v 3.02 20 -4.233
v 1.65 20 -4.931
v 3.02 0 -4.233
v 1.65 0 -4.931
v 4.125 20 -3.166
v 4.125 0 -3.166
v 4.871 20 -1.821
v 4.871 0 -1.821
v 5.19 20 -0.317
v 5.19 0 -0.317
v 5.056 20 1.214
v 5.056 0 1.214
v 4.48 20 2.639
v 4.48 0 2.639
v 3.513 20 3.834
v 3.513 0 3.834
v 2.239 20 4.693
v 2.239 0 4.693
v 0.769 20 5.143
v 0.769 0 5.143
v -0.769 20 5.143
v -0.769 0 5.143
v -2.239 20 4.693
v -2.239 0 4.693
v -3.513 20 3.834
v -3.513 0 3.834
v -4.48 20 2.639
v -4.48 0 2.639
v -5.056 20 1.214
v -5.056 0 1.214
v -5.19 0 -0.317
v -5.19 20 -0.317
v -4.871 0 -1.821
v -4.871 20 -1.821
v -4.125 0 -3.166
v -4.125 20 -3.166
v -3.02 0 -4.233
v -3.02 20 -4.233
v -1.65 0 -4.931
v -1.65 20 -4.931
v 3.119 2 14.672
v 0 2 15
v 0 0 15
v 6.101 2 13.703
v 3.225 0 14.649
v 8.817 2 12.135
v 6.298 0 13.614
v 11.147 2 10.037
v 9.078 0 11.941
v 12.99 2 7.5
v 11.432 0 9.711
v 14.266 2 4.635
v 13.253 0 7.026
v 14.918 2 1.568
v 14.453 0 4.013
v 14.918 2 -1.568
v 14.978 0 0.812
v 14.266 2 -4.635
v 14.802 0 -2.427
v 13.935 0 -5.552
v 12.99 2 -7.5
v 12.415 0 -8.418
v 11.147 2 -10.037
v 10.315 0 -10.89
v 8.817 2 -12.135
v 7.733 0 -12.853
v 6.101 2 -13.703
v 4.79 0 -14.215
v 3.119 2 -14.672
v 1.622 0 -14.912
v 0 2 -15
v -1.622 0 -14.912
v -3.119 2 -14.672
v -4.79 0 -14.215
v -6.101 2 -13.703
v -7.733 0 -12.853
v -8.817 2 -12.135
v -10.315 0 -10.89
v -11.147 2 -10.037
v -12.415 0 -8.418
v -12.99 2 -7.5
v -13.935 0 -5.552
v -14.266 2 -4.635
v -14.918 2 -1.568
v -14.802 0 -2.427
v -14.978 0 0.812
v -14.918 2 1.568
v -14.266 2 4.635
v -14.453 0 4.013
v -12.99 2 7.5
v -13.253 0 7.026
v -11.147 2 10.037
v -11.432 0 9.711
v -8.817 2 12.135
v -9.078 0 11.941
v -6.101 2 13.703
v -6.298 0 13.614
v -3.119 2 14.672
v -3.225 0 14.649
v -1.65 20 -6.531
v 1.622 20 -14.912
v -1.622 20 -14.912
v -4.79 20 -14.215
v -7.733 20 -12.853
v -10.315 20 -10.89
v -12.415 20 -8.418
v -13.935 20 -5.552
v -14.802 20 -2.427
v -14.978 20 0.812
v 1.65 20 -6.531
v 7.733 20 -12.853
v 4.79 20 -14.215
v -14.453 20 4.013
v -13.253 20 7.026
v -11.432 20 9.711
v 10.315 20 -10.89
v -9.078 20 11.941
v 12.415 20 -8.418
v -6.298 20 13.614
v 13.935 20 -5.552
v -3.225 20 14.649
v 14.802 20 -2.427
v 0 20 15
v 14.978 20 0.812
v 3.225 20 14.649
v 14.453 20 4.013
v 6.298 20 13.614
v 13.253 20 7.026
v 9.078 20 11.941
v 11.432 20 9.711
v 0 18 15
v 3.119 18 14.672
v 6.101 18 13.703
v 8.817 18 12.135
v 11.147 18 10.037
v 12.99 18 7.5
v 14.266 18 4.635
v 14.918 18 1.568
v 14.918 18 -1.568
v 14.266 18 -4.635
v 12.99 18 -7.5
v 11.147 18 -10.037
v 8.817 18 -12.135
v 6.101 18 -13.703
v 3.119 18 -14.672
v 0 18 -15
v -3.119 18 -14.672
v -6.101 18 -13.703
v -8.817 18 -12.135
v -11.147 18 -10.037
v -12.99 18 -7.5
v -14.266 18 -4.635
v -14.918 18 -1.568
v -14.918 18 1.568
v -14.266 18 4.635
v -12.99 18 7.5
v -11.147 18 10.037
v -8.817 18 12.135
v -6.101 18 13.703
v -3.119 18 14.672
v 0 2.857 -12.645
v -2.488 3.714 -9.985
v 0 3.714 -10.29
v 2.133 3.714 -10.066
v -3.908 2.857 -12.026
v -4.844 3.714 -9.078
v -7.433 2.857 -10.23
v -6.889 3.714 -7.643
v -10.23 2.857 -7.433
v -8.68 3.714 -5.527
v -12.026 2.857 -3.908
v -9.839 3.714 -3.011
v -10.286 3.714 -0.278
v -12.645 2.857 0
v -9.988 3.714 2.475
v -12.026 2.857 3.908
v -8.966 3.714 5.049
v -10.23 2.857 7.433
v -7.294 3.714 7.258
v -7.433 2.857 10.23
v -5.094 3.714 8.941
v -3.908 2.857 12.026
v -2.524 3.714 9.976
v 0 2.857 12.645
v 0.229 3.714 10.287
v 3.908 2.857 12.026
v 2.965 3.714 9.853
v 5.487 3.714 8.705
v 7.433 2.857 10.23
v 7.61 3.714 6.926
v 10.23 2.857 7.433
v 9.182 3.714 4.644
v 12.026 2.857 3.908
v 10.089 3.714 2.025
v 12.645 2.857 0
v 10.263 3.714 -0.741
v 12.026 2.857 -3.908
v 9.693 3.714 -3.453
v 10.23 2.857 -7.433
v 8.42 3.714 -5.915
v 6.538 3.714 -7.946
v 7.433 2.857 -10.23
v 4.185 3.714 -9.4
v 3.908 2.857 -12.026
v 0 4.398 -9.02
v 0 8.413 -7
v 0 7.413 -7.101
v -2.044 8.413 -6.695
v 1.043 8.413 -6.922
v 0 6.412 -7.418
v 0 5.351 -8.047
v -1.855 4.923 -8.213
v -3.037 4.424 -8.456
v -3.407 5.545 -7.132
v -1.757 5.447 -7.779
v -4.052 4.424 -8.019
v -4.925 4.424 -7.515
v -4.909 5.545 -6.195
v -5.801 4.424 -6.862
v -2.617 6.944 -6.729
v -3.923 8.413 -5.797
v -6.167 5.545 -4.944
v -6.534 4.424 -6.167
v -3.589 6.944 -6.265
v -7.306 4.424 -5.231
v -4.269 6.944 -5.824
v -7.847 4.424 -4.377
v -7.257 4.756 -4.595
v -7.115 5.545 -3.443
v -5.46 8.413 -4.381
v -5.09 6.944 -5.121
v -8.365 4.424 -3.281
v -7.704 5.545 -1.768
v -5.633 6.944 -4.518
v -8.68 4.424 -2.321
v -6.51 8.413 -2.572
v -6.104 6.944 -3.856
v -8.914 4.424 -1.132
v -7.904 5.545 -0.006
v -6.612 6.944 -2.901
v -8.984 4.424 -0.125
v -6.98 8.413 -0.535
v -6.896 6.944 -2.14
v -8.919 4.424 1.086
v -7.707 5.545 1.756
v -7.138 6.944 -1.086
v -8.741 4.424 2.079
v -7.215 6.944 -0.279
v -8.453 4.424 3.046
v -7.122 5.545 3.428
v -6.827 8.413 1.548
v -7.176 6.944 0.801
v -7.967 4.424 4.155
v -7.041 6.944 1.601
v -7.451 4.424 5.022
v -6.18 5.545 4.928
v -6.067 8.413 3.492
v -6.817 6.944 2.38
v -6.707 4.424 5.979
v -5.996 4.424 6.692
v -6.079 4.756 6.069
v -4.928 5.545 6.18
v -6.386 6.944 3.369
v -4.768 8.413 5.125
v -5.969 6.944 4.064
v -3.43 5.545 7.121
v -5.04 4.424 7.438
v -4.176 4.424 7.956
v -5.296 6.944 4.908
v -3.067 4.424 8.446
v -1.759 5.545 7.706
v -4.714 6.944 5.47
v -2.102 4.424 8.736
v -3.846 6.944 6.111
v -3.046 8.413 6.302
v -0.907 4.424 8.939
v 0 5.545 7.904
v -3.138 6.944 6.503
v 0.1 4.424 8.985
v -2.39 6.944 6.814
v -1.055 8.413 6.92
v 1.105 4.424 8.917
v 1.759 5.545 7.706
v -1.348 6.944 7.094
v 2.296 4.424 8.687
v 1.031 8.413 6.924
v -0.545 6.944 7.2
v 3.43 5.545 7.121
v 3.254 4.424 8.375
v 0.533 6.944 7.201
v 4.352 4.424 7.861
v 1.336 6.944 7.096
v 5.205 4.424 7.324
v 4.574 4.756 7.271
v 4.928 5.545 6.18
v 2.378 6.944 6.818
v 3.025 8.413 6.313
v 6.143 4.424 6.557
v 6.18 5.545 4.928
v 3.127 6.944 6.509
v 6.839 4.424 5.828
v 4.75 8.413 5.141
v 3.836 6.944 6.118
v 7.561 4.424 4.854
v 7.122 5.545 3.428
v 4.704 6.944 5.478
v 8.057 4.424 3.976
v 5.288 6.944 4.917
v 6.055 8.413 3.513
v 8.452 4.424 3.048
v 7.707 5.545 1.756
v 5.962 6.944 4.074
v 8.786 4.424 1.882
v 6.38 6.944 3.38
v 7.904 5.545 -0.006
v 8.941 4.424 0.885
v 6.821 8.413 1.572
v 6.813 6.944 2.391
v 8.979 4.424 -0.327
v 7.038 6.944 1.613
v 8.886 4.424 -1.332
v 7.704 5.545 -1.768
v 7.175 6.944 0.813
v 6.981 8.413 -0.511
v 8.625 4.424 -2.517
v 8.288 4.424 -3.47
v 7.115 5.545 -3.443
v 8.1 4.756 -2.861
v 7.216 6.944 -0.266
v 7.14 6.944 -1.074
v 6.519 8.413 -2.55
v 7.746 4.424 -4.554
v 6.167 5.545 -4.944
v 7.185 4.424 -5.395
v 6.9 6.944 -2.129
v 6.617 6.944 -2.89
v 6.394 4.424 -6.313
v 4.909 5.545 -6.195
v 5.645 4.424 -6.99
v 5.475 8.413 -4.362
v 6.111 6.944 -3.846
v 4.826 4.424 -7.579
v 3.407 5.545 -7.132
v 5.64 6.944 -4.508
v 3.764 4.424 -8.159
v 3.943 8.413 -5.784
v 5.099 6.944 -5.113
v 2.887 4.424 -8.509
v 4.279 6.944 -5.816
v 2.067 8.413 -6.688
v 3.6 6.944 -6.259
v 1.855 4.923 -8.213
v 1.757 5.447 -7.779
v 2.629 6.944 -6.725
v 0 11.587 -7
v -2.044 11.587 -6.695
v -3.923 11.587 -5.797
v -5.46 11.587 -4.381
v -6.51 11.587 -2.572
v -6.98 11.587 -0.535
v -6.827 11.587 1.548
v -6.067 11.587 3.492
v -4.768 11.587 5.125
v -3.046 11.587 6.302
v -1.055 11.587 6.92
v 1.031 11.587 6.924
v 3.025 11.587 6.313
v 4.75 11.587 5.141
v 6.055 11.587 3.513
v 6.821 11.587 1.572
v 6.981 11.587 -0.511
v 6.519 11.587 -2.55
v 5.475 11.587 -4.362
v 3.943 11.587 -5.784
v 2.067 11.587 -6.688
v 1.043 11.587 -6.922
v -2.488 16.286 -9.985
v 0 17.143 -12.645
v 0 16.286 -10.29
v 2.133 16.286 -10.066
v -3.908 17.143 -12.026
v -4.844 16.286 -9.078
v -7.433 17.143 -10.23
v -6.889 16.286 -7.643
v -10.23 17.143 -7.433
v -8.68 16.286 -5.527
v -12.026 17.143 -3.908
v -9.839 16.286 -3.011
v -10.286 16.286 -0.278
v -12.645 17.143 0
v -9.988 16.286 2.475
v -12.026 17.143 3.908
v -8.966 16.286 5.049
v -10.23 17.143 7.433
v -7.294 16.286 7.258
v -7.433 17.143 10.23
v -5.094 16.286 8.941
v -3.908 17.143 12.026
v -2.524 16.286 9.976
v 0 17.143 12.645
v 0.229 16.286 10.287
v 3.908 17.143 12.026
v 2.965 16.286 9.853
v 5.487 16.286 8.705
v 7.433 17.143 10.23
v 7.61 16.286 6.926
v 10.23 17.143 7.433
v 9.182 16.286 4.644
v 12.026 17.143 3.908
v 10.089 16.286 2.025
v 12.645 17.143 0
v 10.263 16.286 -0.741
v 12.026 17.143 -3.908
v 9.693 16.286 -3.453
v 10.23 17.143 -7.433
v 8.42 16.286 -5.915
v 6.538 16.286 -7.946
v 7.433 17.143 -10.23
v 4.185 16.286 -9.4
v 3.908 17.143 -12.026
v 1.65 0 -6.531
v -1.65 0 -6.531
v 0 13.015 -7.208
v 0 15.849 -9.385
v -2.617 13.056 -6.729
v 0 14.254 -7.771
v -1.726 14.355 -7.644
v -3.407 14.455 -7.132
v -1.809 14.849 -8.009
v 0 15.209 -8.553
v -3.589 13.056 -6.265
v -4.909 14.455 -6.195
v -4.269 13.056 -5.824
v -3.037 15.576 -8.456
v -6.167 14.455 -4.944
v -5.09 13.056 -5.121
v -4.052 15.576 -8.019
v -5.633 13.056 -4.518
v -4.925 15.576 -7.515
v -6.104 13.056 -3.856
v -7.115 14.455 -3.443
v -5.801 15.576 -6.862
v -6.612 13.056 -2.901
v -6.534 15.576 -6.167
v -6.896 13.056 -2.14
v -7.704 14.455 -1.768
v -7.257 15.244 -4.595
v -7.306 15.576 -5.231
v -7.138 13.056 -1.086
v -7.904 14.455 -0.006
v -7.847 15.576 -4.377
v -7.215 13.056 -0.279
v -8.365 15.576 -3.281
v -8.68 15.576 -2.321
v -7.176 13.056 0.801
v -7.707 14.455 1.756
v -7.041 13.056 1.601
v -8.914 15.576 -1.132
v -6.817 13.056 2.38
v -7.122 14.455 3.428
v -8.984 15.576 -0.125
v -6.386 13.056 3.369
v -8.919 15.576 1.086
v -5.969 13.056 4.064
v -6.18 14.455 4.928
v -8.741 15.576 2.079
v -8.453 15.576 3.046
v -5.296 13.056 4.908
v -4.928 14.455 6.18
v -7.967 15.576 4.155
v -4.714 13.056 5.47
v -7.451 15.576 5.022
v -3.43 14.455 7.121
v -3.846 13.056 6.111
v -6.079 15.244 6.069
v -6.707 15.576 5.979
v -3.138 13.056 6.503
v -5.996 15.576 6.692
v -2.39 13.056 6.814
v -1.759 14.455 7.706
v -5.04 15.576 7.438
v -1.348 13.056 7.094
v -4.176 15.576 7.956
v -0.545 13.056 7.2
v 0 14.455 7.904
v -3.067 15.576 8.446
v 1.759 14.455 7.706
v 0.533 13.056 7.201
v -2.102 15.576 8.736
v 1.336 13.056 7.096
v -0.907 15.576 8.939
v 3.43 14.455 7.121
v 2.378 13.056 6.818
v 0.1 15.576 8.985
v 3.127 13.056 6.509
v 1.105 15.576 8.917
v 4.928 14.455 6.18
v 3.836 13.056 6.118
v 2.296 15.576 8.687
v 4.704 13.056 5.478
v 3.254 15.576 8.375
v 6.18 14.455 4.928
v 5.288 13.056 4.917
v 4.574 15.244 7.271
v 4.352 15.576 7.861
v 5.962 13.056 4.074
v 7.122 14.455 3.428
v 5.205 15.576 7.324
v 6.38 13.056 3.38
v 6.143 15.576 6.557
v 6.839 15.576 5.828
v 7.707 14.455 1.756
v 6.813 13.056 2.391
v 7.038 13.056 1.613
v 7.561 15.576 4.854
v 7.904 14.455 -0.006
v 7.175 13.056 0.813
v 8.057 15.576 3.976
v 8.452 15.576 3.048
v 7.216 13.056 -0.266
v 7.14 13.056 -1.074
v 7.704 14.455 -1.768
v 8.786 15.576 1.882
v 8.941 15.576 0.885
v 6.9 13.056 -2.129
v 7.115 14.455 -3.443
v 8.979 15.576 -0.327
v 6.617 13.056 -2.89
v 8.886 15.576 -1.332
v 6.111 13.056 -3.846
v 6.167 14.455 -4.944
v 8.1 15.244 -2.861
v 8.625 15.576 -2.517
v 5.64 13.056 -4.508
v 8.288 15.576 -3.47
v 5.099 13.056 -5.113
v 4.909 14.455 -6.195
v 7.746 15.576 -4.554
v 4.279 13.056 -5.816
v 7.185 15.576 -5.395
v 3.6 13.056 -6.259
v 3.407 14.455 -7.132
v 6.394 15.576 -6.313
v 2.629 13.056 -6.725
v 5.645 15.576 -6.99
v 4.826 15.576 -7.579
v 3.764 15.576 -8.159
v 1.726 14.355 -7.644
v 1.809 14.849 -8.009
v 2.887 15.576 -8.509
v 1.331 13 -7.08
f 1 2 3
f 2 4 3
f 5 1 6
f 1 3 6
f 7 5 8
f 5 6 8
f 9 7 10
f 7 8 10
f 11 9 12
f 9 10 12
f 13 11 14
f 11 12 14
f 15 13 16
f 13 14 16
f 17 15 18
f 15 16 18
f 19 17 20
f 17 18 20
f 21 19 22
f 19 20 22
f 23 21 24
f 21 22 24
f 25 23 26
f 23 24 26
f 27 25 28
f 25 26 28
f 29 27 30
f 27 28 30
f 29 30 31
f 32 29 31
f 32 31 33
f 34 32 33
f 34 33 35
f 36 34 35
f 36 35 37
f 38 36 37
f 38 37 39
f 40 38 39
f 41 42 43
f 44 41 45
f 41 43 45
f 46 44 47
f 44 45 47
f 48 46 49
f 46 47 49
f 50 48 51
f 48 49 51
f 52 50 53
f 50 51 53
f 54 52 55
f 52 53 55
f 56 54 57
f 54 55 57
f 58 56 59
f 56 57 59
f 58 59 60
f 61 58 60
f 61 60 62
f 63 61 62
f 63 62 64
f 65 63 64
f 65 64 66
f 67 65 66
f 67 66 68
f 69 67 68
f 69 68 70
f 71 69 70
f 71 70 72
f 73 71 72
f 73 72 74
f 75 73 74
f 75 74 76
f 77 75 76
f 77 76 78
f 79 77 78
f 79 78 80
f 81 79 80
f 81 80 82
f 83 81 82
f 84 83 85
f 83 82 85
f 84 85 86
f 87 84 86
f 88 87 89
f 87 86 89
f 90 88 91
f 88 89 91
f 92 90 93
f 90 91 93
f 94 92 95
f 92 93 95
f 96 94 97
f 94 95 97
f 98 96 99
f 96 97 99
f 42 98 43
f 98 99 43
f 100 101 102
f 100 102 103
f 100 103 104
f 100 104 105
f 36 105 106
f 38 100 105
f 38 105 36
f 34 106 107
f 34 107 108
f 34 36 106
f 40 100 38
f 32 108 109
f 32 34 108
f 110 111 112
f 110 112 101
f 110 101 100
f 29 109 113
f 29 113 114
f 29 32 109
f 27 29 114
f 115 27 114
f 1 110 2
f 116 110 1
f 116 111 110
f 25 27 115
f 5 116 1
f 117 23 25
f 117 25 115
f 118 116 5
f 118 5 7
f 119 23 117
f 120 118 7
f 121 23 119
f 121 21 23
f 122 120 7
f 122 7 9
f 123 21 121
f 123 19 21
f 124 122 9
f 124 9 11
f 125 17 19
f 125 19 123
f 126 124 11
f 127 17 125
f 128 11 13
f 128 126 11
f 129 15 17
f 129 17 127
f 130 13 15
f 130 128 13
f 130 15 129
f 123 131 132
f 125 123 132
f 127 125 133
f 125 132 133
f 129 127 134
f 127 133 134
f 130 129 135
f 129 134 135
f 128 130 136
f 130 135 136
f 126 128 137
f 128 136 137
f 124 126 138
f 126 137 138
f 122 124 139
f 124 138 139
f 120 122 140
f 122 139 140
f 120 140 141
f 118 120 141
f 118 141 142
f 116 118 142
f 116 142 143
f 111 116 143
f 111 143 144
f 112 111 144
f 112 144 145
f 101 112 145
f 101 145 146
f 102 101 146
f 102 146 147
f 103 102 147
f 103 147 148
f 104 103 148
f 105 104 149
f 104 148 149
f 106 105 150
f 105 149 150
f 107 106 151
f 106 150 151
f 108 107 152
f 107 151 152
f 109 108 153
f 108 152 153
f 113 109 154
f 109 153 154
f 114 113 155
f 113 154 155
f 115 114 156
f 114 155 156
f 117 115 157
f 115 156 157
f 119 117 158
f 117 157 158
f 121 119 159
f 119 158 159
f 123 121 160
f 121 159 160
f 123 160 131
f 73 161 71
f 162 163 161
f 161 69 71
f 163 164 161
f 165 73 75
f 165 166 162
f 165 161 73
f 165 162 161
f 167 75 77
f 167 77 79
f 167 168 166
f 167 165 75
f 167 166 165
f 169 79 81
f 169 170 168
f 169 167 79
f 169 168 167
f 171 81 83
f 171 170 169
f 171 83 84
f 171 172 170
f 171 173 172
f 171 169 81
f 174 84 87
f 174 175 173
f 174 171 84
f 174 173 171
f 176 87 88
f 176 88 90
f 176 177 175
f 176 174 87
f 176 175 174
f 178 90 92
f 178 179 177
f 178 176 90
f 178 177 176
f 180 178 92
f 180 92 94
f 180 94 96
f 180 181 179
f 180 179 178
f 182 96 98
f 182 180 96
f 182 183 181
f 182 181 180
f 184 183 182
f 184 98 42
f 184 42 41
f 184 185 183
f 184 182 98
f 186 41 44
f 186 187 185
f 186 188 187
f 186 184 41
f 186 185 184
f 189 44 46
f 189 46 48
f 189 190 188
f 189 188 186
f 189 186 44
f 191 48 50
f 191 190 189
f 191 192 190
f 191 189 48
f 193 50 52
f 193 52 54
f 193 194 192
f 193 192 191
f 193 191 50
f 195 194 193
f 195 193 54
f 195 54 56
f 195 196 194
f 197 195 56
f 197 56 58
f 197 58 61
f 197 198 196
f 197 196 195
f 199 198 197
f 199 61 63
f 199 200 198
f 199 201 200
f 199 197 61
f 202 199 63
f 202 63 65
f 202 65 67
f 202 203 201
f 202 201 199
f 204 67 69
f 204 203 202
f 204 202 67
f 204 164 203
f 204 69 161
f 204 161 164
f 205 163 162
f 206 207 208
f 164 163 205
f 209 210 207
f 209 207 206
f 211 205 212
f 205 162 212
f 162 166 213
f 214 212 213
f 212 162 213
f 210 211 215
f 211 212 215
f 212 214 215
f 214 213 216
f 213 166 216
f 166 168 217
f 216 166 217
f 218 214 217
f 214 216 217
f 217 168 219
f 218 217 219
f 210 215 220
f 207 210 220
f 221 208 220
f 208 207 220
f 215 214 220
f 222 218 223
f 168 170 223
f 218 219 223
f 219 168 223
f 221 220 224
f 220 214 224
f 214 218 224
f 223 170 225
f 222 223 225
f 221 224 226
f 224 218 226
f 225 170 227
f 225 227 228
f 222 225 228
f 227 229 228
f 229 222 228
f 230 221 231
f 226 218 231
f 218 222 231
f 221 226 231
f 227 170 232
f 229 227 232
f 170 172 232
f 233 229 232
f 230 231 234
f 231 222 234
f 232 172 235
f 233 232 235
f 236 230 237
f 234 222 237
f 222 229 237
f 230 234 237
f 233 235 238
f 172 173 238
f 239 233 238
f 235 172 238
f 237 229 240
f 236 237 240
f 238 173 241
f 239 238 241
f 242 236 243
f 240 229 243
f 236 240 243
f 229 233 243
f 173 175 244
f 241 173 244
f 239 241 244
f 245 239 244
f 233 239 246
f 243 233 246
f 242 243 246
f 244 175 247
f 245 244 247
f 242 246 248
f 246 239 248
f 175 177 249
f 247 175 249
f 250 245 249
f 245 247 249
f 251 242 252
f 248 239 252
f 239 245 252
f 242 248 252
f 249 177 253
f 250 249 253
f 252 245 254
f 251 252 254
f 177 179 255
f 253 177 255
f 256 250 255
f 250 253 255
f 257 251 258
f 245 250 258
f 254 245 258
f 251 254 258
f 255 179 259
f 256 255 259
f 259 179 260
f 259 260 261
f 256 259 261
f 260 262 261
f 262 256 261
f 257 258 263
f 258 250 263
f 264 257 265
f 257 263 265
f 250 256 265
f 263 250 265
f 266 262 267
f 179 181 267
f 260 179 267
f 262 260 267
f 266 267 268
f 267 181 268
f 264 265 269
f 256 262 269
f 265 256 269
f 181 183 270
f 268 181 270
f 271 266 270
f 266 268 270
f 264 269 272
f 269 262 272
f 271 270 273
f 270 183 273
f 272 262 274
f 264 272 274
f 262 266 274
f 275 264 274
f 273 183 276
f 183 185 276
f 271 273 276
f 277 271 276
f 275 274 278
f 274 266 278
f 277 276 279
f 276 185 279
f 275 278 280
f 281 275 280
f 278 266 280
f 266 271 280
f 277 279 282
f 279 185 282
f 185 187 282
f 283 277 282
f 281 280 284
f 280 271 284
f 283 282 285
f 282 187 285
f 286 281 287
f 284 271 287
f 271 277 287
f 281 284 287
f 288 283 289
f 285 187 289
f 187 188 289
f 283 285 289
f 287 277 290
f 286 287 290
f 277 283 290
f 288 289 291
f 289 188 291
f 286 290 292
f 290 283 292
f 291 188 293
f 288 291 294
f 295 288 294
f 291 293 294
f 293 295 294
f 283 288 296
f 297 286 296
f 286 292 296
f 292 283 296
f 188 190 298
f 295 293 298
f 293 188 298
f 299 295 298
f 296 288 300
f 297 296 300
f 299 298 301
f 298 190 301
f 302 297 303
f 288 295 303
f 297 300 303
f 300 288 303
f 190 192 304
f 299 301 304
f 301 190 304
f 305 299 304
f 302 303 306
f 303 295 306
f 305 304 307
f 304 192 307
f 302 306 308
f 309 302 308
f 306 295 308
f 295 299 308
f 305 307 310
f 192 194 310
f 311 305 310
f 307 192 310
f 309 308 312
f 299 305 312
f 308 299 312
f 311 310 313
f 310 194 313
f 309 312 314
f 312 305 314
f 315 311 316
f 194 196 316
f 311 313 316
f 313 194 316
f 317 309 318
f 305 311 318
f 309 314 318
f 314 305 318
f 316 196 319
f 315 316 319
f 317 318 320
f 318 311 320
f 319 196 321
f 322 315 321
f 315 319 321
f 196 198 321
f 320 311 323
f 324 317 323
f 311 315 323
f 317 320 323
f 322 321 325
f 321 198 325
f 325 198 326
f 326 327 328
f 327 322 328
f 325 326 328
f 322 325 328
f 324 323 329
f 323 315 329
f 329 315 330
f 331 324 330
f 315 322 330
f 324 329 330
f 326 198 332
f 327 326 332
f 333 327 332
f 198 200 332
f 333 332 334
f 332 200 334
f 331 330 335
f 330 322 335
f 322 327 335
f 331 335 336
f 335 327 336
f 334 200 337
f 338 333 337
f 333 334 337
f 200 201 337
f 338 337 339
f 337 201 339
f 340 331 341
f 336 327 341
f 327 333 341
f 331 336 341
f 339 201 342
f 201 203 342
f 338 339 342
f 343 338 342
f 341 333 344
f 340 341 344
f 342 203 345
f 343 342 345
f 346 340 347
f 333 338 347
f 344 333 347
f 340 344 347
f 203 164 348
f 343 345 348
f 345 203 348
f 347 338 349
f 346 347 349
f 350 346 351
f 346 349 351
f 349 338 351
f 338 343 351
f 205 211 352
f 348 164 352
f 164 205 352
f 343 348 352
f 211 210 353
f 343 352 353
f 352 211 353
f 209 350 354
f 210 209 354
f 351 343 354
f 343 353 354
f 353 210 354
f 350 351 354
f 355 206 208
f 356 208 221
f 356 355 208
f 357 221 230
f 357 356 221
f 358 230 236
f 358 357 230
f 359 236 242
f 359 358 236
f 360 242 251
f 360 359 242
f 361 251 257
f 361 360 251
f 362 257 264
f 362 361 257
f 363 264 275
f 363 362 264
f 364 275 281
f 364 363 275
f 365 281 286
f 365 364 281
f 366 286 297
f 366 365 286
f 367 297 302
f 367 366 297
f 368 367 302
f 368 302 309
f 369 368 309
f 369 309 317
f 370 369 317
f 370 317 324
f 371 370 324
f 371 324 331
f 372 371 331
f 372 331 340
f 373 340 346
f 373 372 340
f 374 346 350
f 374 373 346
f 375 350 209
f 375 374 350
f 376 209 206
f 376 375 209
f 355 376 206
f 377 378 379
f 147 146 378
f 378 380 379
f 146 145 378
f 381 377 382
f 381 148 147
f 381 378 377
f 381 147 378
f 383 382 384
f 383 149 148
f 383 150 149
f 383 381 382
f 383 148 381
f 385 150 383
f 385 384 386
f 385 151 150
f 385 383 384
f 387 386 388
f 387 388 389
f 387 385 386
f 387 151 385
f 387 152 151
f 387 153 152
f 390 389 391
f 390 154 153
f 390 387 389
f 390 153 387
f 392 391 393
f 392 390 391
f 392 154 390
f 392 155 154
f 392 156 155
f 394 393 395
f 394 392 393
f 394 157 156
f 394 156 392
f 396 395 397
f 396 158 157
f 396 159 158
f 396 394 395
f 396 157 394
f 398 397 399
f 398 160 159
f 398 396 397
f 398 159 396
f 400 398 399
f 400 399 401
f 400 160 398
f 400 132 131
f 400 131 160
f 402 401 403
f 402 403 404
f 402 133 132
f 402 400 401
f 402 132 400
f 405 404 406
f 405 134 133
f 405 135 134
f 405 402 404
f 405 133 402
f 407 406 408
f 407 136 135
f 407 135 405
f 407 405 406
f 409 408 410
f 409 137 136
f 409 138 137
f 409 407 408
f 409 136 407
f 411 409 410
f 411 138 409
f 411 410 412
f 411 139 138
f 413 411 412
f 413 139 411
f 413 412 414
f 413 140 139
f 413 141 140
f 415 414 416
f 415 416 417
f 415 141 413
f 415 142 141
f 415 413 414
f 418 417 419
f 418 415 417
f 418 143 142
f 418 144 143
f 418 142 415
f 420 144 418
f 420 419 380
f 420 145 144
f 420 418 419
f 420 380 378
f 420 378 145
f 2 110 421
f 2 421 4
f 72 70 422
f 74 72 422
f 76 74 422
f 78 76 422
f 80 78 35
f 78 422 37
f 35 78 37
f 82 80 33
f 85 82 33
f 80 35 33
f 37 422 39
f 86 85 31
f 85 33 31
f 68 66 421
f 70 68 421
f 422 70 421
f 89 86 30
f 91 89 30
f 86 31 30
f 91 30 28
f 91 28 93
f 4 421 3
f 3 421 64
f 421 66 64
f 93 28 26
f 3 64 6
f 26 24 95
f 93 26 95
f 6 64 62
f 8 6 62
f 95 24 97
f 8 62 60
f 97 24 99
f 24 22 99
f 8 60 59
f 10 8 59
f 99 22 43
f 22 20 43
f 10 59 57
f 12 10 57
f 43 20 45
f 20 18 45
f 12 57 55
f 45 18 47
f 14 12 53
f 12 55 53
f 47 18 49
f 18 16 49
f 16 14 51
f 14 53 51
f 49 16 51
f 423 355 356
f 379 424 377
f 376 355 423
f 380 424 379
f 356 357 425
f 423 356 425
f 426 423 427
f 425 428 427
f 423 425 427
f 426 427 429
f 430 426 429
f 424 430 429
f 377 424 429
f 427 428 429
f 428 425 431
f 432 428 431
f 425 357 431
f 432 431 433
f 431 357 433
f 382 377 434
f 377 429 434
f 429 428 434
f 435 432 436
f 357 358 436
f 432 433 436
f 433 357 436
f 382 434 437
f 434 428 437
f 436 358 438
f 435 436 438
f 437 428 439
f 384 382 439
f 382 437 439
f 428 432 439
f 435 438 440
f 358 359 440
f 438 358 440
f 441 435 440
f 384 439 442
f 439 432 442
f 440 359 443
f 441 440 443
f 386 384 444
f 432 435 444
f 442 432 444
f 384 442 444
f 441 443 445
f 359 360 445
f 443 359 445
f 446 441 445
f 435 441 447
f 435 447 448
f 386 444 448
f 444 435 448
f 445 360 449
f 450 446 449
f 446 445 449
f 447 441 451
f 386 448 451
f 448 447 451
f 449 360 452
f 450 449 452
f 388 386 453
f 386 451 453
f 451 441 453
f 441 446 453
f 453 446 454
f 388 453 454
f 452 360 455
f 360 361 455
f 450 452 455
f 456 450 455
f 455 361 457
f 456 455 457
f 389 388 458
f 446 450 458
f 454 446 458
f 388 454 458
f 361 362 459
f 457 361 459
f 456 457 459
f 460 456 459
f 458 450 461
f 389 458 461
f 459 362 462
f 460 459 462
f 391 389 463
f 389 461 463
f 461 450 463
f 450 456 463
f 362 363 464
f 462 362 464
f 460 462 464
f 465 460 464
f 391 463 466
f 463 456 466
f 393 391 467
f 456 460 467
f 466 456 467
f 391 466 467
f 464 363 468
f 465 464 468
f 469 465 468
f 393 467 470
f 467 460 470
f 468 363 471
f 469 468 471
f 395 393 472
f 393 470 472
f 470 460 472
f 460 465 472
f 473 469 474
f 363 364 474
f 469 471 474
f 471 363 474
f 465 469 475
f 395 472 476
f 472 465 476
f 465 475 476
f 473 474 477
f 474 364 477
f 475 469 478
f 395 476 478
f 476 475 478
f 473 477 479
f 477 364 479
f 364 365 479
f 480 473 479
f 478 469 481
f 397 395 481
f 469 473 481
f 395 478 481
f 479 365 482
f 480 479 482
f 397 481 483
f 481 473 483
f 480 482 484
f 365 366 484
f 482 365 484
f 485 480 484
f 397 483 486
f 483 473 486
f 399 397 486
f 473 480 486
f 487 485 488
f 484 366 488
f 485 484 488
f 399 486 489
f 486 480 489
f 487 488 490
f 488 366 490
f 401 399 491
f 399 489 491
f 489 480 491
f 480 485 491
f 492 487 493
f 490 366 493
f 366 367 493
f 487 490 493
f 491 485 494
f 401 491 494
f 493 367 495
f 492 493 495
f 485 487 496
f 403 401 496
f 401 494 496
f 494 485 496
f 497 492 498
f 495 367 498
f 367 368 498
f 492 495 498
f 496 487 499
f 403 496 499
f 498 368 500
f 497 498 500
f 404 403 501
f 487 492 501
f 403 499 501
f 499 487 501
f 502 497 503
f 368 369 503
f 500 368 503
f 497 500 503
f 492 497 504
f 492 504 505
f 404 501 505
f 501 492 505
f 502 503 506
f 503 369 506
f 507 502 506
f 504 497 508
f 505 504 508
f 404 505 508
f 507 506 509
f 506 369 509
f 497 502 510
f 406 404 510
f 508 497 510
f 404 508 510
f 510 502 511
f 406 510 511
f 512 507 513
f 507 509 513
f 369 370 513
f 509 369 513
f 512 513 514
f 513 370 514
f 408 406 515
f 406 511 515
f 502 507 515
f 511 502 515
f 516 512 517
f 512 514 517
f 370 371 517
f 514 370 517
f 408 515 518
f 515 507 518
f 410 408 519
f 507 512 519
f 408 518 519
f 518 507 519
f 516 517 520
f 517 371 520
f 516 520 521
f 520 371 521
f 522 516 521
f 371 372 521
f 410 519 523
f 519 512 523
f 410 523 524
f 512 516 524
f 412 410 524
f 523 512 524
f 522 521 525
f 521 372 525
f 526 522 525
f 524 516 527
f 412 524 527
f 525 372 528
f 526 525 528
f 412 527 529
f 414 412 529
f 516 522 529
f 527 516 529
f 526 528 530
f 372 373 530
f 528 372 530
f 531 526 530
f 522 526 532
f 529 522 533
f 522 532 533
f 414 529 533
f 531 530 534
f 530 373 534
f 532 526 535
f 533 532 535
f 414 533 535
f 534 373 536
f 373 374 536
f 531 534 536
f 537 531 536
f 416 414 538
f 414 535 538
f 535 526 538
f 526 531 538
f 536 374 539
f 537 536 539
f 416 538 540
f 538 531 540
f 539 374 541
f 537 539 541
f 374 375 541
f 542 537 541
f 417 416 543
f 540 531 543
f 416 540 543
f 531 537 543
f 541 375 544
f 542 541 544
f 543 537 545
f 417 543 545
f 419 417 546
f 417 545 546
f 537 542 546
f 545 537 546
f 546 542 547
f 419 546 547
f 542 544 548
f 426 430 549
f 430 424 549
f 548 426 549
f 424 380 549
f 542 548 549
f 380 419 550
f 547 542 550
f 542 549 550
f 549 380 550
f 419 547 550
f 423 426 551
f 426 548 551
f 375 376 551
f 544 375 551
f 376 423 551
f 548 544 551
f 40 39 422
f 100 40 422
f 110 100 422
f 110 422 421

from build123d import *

# Parameters (mm, degrees)
ESBO_O2_R                = 15
RESSALTO_EXTRUS_O1_DEPTH = 20
FUROS_GUIA_COM_10_0MM1_D = 10.4
CORTE_EXTRUS_O1_DEPTH    = 30.154759474
FILETE1_R                = 5


with BuildPart() as part:
    # Esboço2 → Ressalto-extrusão1 (new body)
    with BuildSketch(Plane(origin=(0, 0, 0), x_dir=(1, 0, 0), z_dir=(0, 1, 0))):
        with Locations(Location((0, 0, 0), (0, 0, 270))):
            Circle(ESBO_O2_R)
    extrude(amount=RESSALTO_EXTRUS_O1_DEPTH)

    # Furos-guia com Ø10.0mm1 (through all)
    with Locations(Plane(origin=(0, 20, 0), x_dir=(1, 0, 0), z_dir=(0, 1, 0))):
        with Locations((0, 0)):
            Hole(FUROS_GUIA_COM_10_0MM1_D / 2)

    # Esboço6 → Corte-extrusão1 (cut, through all)
    with BuildSketch(Plane(origin=(0, 20, 0), x_dir=(1, 0, 0), z_dir=(0, 1, 0))):
        with BuildLine():
            Line((-1.65, 4.931277725), (-1.65, 6.531277725))
            Line((-1.65, 6.531277725), (1.65, 6.531277725))
            Line((1.65, 6.531277725), (1.65, 4.931277725))
            ThreePointArc((1.65, 4.931277725), (0, 5.189536775), (-1.65, 4.931277725))
        make_face()
    extrude(amount=-CORTE_EXTRUS_O1_DEPTH, mode=Mode.SUBTRACT)

    # Esboço7 → Corte-Revolução1 (revolve, cut)
    with BuildSketch(Plane.XY, mode=Mode.PRIVATE) as corte_revolu_o1_sk:
        Polygon((-15, 18), (-15, 2), (-7, 4.911761874), (-7, 15.088238126), align=None)
    revolve(corte_revolu_o1_sk.sketch.rotate(Axis((0, 0, 0), (0, 1, 0)), 270), axis=Axis((0, 0, 0), (0, 1, 0)), mode=Mode.SUBTRACT)

    # Filete1
    filete1_edges = [part.edges().sort_by_distance(p)[0] for p in [
        (0, 15.088238126, 7),
        (0, 4.911761874, 7),
    ]]
    fillet(filete1_edges, radius=FILETE1_R)


solid = part.part
